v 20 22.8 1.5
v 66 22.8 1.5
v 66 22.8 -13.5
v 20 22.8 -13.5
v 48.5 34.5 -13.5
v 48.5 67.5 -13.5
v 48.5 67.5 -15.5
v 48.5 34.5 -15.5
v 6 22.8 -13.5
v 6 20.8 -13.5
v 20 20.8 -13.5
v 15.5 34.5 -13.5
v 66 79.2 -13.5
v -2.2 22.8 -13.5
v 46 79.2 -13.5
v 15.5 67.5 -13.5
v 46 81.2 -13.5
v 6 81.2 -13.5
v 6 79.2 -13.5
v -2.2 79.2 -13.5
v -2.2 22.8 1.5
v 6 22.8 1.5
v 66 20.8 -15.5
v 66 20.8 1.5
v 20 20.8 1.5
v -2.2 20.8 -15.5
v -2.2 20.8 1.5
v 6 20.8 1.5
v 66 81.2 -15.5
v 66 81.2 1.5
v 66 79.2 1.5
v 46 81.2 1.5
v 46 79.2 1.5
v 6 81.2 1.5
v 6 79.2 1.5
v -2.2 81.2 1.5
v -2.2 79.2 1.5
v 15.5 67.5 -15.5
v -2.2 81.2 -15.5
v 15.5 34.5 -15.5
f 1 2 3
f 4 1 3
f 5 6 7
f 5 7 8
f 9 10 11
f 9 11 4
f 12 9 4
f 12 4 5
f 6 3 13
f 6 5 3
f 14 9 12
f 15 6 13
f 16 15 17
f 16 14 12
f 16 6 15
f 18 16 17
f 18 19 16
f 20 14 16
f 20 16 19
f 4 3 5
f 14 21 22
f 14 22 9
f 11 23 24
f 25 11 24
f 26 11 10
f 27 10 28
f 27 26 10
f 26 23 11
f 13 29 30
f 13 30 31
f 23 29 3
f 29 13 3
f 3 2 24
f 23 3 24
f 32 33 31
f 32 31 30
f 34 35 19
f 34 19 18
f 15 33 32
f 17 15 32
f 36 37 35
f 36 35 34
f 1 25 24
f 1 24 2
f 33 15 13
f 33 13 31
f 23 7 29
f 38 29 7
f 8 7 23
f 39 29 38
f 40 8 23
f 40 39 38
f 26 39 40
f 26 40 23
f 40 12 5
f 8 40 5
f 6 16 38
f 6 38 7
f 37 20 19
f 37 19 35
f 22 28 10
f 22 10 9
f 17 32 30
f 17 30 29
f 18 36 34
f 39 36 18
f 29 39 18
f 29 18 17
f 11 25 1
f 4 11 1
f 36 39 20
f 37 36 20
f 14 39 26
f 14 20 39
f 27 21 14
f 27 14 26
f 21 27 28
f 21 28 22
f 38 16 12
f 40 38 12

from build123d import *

# Parameters (mm, degrees)
SKETCH121_W      = 33
SKETCH121_H      = 33
EXTRUDE110_DEPTH = 4
SKETCH116_W      = 4
SKETCH116_H      = 36
SKETCH116_W_2    = 40
SKETCH116_H_2    = 4
SKETCH116_W_3    = 14
EXTRUDE105_DEPTH = 16.5
EXTRUDE104_DEPTH = 68.2


with BuildPart() as extrude110:
    # Sketch121 → Extrude110 (new body)
    with BuildSketch(Plane(origin=(0, 0, -13), x_dir=(1, 0, 0), z_dir=(0, 0, -1))):
        with Locations((32, -51)):
            Rectangle(SKETCH121_W, SKETCH121_H)
    extrude(amount=EXTRUDE110_DEPTH)


with BuildPart() as compound027:
    # Sketch116 → Extrude105 (new body)
    with BuildSketch(Plane.XY.offset(3)):
        with Locations((-1, 51)):
            Rectangle(SKETCH116_W, SKETCH116_H)
        with Locations((26, 80)):
            Rectangle(SKETCH116_W_2, SKETCH116_H_2)
        with Locations((13, 22)):
            Rectangle(SKETCH116_W_3, SKETCH116_H_2)
    extrude(amount=-EXTRUDE105_DEPTH)

    # Compound027: union Extrude110
    add(extrude110.part)


with BuildPart() as cut018:
    # Sketch115 → Extrude104 (new body)
    with BuildSketch(Plane.YZ.offset(-2.2)):
        Polygon((20.8, 1.5), (22.8, 1.5), (22.8, -13.5), (79.2, -13.5), (79.2, 1.5), (81.2, 1.5), (81.2, -15.5), (20.8, -15.5), align=None)
    extrude(amount=EXTRUDE104_DEPTH)

    # Cut018: cut Compound027
    add(compound027.part, mode=Mode.SUBTRACT)


solid = cut018.part
